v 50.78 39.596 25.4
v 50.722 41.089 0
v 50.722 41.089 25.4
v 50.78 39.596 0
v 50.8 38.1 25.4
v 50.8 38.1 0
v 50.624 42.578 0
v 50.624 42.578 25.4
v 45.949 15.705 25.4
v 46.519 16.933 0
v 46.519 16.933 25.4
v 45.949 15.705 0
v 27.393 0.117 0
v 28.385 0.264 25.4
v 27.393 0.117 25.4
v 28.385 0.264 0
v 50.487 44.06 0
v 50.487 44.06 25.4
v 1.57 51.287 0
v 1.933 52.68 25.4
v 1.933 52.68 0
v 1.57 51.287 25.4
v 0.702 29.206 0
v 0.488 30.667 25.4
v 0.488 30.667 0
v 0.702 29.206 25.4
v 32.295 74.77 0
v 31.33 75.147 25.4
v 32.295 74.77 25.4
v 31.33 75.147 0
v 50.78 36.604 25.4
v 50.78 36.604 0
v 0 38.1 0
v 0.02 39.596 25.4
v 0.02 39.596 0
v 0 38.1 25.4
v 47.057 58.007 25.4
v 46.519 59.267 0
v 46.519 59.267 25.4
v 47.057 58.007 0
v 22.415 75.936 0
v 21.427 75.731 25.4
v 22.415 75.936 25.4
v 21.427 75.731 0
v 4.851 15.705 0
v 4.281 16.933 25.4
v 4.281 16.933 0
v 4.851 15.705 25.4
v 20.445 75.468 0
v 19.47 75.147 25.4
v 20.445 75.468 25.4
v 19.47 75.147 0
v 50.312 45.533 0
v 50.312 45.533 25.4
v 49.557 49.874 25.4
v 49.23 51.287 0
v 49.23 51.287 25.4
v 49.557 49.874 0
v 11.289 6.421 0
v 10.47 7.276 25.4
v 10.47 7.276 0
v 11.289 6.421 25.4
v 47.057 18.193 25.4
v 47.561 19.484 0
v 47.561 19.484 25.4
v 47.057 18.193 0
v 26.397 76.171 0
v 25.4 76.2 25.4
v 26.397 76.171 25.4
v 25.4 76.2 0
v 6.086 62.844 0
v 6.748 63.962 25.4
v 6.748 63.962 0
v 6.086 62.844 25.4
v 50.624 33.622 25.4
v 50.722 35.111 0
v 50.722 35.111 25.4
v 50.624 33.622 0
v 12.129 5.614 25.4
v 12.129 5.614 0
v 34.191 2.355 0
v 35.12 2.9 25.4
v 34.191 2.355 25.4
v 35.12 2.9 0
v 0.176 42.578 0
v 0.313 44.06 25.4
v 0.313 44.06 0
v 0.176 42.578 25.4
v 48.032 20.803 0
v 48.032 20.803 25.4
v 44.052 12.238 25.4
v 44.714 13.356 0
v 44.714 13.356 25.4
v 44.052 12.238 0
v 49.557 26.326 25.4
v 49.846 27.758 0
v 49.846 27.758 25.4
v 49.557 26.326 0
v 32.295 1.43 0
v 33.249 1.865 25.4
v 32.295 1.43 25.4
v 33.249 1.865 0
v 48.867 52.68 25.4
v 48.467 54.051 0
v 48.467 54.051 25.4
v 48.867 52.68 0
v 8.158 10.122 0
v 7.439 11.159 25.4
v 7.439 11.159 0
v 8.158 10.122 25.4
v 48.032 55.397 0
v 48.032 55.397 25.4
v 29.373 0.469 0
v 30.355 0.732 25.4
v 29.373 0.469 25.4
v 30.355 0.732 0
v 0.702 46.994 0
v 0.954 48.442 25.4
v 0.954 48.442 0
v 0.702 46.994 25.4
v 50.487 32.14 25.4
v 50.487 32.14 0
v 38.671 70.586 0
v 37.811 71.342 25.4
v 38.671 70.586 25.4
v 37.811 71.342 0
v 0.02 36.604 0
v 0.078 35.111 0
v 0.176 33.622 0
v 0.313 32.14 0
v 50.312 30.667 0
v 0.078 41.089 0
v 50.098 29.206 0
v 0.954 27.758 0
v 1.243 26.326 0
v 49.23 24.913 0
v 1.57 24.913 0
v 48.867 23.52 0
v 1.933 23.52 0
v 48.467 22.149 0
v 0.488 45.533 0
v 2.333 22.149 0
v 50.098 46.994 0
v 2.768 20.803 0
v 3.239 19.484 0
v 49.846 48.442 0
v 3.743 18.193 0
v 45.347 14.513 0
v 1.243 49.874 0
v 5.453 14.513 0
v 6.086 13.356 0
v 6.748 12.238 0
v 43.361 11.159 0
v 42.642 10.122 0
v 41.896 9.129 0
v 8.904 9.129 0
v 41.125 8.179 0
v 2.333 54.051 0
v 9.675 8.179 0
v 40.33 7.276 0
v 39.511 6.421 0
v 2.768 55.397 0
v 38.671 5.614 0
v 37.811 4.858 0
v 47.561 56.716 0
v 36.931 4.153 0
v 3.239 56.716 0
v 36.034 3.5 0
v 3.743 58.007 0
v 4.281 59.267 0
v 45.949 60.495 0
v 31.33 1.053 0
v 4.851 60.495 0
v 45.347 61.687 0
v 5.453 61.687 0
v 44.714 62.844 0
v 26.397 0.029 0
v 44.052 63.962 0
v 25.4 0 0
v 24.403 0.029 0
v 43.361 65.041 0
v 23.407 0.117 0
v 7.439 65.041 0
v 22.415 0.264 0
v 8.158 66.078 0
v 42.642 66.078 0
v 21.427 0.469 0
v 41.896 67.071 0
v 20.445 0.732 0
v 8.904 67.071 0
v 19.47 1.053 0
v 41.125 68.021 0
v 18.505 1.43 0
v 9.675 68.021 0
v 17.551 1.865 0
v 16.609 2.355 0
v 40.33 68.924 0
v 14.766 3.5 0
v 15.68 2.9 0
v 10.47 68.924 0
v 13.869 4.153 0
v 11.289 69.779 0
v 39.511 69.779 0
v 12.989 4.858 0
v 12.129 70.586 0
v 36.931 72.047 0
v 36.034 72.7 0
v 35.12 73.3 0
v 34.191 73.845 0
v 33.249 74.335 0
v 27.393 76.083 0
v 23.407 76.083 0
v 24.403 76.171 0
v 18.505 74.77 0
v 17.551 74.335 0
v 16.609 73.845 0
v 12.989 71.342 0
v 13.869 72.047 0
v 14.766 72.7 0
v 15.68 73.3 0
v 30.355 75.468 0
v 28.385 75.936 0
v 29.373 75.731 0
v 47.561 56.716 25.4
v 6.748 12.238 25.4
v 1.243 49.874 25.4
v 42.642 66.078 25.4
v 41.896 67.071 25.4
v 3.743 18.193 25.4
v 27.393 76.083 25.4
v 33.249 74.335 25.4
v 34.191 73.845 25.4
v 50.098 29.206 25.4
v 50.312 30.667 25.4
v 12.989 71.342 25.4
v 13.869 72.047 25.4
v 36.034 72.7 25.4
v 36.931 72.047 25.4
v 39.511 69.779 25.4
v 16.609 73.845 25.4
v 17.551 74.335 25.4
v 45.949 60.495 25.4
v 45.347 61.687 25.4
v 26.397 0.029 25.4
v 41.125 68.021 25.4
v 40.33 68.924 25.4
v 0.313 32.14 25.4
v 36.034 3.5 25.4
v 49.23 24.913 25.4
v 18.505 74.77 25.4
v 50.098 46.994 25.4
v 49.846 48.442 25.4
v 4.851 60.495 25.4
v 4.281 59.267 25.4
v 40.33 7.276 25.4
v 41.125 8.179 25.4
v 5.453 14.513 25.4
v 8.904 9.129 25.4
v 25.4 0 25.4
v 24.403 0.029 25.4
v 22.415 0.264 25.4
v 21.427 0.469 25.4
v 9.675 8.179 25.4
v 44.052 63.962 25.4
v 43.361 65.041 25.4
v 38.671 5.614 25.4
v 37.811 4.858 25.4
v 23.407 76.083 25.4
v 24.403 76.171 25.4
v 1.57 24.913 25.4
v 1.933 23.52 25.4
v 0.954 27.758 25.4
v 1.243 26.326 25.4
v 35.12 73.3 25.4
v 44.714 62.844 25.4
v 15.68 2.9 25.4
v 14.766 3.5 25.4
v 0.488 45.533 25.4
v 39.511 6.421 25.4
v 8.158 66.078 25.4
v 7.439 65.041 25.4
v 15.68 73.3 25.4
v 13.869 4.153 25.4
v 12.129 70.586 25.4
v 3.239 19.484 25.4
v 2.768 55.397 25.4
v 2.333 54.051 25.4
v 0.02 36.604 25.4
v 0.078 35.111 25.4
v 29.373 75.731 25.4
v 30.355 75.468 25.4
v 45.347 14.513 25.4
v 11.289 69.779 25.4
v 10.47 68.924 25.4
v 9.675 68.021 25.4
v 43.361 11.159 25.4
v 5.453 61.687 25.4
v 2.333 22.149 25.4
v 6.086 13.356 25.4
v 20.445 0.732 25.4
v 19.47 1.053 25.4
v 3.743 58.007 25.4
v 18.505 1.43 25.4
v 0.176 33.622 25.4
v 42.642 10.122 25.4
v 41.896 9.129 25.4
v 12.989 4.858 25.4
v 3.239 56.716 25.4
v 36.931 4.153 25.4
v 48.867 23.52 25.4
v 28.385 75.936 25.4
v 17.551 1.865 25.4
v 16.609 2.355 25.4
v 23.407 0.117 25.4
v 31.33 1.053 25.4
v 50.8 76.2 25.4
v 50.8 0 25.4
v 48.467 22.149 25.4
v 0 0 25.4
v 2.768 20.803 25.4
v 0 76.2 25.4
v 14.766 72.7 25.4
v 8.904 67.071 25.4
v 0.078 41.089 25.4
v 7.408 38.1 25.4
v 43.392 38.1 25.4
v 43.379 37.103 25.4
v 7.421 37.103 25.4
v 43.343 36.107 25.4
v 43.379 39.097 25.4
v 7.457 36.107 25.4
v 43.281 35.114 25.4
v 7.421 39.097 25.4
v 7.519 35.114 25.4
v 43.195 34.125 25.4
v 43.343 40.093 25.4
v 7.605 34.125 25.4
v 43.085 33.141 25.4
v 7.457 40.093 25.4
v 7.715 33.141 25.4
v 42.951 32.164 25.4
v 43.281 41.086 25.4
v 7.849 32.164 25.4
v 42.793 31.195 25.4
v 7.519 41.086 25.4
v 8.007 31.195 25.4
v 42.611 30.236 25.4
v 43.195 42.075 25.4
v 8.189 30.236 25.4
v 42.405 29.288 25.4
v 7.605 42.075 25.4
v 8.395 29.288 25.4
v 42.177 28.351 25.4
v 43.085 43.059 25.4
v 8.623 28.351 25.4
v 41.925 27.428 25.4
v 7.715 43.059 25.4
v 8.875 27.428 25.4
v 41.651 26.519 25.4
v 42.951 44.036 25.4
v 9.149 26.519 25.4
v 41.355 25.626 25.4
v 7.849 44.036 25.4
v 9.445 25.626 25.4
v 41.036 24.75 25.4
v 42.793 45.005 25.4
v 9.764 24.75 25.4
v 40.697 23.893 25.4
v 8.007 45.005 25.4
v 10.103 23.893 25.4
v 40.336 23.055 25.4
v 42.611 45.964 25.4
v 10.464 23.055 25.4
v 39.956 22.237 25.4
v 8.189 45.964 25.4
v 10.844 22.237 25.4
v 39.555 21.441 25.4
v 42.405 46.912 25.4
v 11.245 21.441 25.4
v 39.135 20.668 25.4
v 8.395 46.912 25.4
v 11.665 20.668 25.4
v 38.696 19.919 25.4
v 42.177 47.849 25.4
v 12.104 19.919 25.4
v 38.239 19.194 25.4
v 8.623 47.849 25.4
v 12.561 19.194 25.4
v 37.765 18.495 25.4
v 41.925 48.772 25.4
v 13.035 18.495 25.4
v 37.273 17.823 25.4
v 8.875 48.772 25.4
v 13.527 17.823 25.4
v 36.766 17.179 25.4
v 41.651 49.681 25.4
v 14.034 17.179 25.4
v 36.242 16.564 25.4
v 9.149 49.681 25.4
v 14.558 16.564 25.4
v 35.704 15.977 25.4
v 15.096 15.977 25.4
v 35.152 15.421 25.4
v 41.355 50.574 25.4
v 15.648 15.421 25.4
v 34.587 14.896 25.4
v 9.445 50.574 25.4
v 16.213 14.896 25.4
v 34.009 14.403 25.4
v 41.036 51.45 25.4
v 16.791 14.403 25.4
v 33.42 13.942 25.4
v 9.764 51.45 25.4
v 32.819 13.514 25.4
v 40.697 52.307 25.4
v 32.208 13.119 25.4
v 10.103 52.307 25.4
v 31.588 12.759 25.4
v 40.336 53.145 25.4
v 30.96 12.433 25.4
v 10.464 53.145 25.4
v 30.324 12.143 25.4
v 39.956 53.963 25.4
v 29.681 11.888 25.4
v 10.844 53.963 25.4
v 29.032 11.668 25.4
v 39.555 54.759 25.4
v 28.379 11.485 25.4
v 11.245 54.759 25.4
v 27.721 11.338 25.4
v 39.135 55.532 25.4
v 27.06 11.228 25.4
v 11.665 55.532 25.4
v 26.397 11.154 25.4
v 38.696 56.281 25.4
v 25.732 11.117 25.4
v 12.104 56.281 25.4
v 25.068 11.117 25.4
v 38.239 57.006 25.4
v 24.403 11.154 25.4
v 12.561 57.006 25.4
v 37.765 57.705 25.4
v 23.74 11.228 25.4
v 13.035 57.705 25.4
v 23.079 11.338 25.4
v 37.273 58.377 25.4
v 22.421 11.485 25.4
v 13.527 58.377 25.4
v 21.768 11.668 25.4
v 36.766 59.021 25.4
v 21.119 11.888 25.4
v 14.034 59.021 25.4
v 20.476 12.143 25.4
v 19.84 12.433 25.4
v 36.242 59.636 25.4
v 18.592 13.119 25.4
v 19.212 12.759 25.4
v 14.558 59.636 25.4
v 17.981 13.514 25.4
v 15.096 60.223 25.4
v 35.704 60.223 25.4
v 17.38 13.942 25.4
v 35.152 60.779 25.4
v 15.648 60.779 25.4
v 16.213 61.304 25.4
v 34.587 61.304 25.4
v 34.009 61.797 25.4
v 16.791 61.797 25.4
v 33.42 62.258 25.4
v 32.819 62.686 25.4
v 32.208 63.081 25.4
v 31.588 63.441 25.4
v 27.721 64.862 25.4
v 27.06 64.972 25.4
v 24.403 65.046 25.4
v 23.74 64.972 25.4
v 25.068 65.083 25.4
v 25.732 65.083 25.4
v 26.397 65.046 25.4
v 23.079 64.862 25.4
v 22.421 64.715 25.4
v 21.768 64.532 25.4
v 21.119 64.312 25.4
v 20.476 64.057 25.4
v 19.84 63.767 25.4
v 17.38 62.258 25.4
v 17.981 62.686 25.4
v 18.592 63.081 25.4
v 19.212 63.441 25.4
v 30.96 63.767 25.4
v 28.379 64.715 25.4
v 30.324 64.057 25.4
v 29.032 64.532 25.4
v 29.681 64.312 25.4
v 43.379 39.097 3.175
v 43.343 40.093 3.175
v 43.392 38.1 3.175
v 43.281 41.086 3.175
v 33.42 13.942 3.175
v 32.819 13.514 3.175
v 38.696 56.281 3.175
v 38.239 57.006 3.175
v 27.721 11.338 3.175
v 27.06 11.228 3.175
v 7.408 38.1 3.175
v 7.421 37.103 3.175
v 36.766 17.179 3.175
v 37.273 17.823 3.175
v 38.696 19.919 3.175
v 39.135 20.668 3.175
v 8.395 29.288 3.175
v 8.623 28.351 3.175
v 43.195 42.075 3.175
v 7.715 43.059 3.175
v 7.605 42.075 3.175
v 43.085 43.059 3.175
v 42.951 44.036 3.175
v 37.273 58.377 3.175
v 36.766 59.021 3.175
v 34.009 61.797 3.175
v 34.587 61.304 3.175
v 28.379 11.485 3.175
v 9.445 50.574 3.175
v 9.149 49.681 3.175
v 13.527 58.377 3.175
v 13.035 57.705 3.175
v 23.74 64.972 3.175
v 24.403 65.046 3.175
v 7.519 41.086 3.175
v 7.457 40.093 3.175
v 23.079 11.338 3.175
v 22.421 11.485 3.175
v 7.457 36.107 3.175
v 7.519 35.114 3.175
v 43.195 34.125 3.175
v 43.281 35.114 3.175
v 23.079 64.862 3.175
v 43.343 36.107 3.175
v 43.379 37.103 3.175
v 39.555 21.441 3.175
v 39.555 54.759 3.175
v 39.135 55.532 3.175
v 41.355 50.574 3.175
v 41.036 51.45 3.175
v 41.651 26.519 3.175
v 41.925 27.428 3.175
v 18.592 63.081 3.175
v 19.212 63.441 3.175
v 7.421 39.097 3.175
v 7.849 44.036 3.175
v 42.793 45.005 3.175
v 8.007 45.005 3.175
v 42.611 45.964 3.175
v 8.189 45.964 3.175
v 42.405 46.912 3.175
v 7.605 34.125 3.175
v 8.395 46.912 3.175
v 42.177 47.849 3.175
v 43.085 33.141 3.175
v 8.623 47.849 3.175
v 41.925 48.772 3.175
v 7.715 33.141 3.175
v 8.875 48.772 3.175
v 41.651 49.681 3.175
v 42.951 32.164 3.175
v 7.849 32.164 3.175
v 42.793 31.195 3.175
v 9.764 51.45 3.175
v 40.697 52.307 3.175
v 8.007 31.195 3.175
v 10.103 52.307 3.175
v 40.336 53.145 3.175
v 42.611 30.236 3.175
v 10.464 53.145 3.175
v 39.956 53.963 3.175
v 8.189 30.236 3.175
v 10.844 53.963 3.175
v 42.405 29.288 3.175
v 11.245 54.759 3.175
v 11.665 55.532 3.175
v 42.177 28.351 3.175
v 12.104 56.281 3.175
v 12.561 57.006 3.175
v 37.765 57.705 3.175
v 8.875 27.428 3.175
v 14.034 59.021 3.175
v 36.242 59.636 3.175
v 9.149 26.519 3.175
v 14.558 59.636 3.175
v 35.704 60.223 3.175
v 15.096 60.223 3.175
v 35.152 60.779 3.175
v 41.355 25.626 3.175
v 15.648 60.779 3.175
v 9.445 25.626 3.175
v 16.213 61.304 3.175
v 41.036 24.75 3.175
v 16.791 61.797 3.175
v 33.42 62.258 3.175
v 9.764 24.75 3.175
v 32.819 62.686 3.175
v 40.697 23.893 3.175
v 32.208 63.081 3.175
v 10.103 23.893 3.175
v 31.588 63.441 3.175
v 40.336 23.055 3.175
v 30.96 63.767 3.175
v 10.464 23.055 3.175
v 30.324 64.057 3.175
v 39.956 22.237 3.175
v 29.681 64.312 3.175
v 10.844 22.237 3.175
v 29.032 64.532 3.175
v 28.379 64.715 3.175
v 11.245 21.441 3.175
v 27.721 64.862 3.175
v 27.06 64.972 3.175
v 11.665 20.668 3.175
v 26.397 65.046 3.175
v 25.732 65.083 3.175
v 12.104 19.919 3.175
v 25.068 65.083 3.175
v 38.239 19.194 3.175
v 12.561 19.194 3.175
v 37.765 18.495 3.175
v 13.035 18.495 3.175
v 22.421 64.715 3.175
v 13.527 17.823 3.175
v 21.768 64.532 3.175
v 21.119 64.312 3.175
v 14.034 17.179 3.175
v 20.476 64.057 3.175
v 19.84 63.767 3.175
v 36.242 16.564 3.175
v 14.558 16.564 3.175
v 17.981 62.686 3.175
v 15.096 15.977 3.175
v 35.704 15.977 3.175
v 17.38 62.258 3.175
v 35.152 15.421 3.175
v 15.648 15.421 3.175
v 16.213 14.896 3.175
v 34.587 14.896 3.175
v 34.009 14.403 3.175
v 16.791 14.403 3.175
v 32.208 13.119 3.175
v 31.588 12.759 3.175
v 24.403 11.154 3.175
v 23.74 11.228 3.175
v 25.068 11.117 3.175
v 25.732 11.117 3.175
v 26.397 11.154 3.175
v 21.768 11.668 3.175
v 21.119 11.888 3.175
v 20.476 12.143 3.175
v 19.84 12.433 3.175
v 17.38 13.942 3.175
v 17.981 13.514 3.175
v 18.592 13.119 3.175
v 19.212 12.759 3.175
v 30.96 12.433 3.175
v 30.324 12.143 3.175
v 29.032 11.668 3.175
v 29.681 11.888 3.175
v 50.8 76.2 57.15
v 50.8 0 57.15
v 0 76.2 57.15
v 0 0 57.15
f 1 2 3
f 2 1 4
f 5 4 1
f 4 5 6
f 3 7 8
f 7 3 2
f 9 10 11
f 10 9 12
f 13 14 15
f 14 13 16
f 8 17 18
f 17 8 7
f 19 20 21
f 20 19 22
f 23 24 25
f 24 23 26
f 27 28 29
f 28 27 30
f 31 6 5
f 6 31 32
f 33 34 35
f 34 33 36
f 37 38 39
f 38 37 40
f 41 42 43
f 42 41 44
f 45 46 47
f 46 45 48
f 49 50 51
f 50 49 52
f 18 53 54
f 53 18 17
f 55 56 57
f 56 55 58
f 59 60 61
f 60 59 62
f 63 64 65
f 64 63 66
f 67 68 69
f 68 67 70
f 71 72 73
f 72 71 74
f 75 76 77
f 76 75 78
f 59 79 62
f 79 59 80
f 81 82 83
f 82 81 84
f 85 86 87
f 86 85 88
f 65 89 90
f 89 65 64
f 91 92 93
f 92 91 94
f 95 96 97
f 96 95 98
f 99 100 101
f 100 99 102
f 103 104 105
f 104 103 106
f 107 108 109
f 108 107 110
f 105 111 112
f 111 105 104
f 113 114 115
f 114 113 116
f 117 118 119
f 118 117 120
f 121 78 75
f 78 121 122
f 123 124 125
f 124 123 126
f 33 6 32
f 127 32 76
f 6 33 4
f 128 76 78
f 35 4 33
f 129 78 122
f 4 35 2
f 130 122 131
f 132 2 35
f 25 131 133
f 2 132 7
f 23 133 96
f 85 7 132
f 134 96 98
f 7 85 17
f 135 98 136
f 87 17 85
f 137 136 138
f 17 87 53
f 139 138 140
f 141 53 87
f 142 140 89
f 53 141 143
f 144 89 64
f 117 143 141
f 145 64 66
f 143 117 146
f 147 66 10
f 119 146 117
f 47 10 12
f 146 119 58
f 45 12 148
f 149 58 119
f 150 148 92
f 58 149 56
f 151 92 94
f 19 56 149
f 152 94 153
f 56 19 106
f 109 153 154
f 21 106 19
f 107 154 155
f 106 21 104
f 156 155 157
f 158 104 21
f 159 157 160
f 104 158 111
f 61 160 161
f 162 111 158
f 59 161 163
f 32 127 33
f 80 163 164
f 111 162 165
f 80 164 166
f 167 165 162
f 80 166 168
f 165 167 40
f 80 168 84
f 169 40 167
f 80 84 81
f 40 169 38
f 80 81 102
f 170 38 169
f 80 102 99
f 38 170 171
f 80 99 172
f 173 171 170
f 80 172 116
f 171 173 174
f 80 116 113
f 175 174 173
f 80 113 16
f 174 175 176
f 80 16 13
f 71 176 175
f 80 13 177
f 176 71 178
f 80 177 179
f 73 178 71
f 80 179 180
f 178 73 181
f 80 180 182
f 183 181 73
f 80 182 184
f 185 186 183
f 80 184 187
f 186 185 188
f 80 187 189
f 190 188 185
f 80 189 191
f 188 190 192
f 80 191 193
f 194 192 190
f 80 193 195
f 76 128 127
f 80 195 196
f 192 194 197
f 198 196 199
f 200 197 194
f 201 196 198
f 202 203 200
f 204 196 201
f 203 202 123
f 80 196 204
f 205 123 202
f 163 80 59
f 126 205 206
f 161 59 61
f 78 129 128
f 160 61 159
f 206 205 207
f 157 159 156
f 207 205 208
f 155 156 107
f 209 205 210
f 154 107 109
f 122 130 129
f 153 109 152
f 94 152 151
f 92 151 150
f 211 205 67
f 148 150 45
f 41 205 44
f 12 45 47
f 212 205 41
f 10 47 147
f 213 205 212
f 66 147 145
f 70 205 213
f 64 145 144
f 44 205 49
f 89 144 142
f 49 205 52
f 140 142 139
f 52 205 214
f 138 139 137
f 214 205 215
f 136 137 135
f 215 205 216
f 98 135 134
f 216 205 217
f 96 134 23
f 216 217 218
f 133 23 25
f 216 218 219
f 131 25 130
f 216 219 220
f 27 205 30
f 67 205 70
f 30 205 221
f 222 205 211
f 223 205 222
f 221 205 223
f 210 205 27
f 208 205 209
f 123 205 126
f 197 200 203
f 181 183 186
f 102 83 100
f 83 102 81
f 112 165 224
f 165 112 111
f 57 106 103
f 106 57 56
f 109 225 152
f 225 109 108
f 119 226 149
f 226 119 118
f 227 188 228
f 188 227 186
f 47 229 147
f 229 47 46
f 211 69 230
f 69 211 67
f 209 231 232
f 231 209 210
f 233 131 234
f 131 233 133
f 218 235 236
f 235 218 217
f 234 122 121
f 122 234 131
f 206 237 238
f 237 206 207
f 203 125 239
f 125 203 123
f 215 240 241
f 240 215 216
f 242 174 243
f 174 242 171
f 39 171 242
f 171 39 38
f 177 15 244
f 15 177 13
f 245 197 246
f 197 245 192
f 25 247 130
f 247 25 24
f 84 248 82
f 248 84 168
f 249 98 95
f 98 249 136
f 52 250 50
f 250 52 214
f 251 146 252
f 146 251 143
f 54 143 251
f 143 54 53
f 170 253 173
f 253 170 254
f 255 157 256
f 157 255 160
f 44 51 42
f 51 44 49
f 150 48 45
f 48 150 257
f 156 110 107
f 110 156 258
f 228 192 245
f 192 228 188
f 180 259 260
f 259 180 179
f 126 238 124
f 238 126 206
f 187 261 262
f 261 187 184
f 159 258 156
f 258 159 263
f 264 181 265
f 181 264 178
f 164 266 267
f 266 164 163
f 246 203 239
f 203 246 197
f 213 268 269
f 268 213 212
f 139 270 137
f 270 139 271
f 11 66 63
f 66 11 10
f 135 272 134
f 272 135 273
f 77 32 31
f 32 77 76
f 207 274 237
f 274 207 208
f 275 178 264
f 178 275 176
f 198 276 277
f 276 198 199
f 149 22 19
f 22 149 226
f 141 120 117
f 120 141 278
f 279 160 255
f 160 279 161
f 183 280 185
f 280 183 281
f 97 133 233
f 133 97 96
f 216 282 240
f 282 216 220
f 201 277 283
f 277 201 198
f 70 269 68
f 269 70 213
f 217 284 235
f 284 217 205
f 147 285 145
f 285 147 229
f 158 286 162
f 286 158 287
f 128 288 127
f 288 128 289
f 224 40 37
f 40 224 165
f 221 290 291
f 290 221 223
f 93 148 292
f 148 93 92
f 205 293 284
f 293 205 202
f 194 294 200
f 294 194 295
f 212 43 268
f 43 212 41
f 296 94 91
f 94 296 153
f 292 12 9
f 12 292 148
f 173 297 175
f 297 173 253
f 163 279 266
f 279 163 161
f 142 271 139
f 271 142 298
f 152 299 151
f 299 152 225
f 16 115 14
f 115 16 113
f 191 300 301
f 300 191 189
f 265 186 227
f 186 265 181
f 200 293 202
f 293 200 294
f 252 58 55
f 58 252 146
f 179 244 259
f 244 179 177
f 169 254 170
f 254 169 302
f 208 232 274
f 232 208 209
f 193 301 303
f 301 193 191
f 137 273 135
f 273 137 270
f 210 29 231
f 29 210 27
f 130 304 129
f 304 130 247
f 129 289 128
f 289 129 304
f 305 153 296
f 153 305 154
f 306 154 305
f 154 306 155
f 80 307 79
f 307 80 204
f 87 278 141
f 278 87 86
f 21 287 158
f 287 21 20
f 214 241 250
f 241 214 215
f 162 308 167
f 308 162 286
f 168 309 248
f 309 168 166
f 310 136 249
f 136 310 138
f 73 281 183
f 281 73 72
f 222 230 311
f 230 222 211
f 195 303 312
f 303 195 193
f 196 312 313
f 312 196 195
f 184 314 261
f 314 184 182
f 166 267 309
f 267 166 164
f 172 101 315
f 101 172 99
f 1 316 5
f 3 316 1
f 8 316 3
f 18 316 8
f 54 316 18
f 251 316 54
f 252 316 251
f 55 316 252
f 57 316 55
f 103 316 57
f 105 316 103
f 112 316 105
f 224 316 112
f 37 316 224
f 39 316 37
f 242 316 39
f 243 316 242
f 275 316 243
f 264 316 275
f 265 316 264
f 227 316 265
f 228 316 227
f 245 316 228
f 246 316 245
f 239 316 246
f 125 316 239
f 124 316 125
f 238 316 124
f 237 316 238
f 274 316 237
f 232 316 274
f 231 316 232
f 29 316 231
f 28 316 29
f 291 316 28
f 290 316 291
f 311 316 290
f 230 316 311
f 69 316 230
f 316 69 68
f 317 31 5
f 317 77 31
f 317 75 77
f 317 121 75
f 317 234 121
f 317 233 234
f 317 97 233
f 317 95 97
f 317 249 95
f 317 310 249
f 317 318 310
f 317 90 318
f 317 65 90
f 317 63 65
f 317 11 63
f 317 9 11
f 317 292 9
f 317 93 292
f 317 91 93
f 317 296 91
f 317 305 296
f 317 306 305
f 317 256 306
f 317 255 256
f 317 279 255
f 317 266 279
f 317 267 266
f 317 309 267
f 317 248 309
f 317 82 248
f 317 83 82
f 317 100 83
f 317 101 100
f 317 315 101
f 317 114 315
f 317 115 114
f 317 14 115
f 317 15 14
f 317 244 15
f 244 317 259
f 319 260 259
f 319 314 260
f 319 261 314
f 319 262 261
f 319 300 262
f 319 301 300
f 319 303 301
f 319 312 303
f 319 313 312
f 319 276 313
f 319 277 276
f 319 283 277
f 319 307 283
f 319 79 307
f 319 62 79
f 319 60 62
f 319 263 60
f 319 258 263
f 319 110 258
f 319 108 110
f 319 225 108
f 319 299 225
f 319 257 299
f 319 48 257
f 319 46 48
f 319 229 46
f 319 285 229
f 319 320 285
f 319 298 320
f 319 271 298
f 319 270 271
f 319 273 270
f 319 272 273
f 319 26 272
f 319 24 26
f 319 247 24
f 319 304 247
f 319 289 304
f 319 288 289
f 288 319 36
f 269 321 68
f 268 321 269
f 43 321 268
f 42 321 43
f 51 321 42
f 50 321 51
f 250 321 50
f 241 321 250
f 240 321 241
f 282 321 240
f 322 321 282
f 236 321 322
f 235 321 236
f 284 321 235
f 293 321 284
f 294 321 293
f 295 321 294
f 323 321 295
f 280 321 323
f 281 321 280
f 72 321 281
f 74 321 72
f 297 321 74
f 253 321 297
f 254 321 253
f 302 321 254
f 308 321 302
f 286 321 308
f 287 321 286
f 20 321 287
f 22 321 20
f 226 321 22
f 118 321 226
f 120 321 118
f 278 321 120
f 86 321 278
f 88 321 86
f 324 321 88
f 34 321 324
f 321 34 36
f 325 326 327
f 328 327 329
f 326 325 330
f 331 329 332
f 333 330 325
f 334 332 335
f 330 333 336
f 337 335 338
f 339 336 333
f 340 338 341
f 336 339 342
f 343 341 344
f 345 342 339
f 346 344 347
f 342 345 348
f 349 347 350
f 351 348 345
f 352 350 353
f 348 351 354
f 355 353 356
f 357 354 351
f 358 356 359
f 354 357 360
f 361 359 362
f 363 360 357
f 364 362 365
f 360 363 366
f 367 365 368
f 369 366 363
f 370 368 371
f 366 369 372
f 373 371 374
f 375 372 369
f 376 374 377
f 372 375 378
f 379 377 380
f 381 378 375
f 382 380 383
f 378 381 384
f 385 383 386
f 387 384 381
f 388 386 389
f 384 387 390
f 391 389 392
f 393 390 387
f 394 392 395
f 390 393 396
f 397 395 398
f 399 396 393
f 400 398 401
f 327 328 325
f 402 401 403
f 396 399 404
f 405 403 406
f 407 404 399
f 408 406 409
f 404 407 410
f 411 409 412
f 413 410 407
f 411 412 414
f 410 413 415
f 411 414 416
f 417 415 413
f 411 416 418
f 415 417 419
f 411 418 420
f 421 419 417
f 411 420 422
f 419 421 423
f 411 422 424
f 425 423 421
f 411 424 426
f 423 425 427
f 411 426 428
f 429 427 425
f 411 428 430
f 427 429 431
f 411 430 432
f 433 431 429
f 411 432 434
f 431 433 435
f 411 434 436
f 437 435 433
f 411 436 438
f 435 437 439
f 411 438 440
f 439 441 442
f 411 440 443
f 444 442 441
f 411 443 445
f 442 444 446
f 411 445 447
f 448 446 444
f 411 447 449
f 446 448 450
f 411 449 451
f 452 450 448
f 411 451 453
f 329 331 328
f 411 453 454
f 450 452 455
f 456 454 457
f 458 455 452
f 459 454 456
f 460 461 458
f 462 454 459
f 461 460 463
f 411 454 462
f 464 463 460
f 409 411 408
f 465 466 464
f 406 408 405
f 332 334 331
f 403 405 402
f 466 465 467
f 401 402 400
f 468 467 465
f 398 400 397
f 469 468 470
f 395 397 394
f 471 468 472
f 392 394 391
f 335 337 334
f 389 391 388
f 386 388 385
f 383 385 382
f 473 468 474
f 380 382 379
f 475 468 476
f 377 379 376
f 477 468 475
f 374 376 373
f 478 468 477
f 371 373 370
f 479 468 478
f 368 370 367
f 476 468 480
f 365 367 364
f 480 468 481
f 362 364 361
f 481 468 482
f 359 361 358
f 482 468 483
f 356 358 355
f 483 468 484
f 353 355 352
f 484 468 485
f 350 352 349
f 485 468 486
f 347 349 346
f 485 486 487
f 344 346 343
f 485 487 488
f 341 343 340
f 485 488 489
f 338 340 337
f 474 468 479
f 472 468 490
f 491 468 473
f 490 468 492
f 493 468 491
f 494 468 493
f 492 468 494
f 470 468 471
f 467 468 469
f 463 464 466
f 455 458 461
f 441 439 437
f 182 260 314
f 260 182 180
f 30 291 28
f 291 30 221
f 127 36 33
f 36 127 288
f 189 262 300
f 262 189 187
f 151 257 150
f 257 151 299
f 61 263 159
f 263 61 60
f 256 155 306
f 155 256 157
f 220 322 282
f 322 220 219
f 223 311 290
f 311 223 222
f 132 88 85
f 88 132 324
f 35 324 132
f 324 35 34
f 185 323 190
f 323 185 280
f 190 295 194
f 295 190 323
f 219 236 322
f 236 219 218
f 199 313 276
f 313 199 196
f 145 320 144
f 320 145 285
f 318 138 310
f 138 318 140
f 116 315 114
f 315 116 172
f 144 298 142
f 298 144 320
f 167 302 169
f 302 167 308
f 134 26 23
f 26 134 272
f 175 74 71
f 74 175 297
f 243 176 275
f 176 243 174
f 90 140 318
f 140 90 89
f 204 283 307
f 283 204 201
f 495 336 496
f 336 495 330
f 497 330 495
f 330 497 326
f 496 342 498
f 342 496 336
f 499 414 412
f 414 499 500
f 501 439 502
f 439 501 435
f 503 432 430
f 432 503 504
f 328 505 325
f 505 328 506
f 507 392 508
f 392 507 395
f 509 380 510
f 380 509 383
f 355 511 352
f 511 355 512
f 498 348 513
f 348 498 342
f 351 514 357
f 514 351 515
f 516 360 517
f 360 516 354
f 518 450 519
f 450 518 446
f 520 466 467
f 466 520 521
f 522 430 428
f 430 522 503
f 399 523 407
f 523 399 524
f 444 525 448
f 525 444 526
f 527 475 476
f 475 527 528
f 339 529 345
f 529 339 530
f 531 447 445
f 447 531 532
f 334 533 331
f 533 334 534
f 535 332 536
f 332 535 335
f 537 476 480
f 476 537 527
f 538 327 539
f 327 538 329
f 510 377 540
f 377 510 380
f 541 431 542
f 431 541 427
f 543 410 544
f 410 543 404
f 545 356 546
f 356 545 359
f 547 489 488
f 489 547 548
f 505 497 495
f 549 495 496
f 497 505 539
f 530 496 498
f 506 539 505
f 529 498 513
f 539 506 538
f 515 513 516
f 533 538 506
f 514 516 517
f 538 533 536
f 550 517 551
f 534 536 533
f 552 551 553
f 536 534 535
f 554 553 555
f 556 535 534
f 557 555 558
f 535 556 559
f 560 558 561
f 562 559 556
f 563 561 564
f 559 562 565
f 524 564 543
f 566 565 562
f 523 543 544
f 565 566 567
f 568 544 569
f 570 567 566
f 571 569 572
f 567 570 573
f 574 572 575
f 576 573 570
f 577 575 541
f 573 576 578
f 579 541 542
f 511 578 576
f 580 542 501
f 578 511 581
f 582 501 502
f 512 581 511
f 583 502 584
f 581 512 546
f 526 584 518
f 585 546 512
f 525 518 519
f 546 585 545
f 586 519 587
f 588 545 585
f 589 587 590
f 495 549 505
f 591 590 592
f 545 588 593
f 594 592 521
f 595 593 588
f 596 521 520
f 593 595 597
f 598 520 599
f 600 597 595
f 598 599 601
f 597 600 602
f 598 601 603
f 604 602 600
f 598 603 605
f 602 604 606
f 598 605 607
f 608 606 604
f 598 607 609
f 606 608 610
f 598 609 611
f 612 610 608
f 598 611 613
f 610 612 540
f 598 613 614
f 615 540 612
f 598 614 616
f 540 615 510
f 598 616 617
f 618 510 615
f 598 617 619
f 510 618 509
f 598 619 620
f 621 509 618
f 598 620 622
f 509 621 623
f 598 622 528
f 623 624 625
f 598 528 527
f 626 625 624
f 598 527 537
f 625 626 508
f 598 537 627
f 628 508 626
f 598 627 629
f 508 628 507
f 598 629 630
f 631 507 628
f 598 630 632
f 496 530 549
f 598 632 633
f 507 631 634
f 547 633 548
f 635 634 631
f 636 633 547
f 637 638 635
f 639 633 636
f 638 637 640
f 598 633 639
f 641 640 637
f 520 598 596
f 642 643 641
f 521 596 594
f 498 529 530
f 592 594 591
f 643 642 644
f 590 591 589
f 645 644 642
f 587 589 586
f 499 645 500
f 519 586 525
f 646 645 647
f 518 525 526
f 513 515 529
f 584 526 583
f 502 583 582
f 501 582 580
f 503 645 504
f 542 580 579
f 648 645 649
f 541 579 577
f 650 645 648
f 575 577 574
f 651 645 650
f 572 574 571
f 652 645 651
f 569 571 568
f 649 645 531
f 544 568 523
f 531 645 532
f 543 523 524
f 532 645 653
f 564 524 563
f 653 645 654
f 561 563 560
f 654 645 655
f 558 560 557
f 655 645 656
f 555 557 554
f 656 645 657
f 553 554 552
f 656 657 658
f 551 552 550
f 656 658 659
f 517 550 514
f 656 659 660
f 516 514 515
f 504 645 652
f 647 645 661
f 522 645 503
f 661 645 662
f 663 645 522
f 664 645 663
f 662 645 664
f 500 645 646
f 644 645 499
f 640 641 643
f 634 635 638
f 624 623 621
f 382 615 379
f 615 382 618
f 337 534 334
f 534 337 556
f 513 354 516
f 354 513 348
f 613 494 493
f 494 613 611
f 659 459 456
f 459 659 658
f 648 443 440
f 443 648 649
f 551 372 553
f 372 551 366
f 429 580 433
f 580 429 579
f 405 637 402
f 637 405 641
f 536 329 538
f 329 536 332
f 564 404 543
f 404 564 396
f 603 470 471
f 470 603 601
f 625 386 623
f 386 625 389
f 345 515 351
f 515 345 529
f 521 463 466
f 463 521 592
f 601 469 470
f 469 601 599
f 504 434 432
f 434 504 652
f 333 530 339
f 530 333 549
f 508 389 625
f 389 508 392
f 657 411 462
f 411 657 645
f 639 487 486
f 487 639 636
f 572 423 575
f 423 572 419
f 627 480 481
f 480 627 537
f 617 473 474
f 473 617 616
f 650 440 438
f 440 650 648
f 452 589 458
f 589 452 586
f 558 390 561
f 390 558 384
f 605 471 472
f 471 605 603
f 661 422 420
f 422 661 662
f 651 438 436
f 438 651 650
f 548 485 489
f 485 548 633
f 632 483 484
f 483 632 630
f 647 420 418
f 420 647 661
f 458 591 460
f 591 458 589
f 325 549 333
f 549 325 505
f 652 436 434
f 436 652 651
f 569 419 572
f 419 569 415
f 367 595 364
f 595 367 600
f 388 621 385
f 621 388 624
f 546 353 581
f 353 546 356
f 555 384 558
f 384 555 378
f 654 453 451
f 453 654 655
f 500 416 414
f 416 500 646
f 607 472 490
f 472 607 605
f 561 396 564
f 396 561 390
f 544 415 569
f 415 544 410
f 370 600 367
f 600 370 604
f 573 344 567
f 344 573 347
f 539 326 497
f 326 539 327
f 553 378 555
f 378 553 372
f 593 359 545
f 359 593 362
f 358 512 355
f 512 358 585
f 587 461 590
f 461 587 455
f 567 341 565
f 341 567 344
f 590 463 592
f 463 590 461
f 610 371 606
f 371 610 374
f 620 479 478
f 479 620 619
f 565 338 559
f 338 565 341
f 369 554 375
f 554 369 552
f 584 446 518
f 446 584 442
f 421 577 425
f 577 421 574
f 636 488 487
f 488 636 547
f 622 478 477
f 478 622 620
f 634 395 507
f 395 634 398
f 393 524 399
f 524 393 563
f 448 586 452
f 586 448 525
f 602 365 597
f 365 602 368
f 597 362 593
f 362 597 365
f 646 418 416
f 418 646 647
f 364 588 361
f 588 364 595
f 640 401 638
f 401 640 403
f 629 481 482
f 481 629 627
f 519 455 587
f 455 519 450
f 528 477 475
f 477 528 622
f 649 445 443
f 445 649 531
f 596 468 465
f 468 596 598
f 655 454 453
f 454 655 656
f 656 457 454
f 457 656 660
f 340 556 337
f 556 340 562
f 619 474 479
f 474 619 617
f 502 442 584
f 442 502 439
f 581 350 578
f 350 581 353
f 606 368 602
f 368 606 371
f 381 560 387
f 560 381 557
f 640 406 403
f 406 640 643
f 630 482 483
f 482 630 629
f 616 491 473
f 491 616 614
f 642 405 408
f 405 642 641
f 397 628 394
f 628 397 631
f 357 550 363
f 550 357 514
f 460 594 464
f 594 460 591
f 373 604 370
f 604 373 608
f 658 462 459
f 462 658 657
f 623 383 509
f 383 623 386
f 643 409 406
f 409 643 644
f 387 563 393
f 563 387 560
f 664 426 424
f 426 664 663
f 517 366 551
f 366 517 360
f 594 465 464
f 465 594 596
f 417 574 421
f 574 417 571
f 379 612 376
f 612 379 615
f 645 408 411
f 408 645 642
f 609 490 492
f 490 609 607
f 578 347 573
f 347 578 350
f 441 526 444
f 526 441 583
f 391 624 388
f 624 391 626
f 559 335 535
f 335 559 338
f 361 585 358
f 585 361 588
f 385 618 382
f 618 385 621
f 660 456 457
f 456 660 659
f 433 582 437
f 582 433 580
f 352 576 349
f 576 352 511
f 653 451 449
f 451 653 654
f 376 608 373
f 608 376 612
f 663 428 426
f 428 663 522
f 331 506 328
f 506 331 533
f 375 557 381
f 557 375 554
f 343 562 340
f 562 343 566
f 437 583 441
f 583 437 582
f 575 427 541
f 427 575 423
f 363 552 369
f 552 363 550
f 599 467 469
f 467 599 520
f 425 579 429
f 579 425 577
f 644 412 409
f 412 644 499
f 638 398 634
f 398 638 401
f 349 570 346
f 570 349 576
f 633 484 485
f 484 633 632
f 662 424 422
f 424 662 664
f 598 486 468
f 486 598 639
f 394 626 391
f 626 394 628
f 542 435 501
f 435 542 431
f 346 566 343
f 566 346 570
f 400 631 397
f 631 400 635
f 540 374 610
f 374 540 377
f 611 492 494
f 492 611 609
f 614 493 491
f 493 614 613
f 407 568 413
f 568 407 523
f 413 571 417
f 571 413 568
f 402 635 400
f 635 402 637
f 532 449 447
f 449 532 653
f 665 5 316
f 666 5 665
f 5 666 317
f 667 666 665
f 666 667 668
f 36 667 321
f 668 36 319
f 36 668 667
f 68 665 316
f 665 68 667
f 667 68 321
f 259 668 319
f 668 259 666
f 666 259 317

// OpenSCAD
//Please use the Customizer to interact with this (if necessary, show it by clearing the checkbox in front of View | Hide Customizer), and close this Editor window.

/* [Overview] */
//Part
PARTNO = "0"; // [0:All, 1:Top, 2:Bottom]

//Type of Lid (to implement: 2:Hinged)
LidType = "0"; // [0:None, 1:Fitted]

//Type of Corner (to implement: 3:Chamfered, 4:Inset Circle (Flipped Fillet))
BoxShape = "0"; // [0:Round/Oval, 1:Square, 2:Rounded (Fillet)]

//Size of Corner Feature
cornersize=0.25;


//Height of box bottom (expressed as a percentage if using a lid)
boxbottomheight=50; // [0:100]

//Endmill Diameter
diameter=0.125;

//Fit Tolerance
fittolerance=0.001;

//Part Spacing
partspacing=2;

$fa=1;
$fs=1;
//$fn=100;

//Units
Units="0"; // [0:Inches, 1:Millimeters]

/* [Size] */
//Length
length = 3;

//Width
width = 2;

//Height
height = 2;

//Thickness
thickness = 0.375;

//Lid and Bottom Thickness
bottomthickness=0.125;

/* [Dividers] */
//Number of Dividers
Dividers = 0;

//Orientation of Dividers
DividerOrientation = "0"; // [0:widthwise, 1:lengthwise, 2:grid, 3:diagonal, 4:grid with lengthwise pocket, 5:grid with widthwise pocket]


conversionfactor = (Units=="0") ? 25.4 : 1;

cwidth = width*conversionfactor;
clength = length*conversionfactor;
cheight = height*conversionfactor;
cthickness = thickness*conversionfactor;
cbottomthickness=bottomthickness*conversionfactor;
cpartspacing=partspacing*conversionfactor;

ccs=cornersize*conversionfactor;

cdiameter = diameter*conversionfactor;
ctolerance = fittolerance*conversionfactor;

cinteriorwidth = cwidth-cthickness*2;
cinteriorlength = clength-cthickness*2;

cinteriorheight=cheight-cbottomthickness*2-cthickness;

//Height of Dividers (percentage of interior height)
//DividerHeight = 50; //[0:100]

//cdivheight=cinteriorheight*DividerHeight/100;

Divs=Dividers+1;

cadjh=cbottomthickness*2+((cheight-cbottomthickness*2)*boxbottomheight/100)-cdiameter;


module HP(x,y,z,w,l,h,d){hull() {
translate([x+d/2,y+d/2,z]) cylinder(h = h, r1 = d/2, r2 = d/2, center = false);
translate([w+x-d/2,y+d/2,z]) cylinder(h = h, r1 = d/2, r2 = d/2, center = false);
translate([w+x-d/2,l+y-d/2,z]) cylinder(h = h, r1 = d/2, r2 = d/2, center = false);
translate([x+d/2,l+y-d/2,z]) cylinder(h = h, r1 = d/2, r2 = d/2, center = false);
};};

module pocket(x,y,z,a,b,c,e,h,d){hull() {
translate([x,y,z]) cylinder(h = h, r1 = d/2, r2 = d/2, center = false);
translate([a,b,z]) cylinder(h = h, r1 = d/2, r2 = d/2, center = false);
translate([c,e,z]) cylinder(h = h, r1 = d/2, r2 = d/2, center = false);
};};

module chamferedbox(x,y,z,w,l,h,d){difference() {translate([x,y,z]) cube(size = [w,l,h], center = false);
union(){
rotate([0,0,45]) translate([-d,-d,-h/10])cube(size = [d*2,d*2,h*1.2], center = false);
translate([cwidth,-d*1.5,-h/10])rotate([0,0,45]) cube(size = [d*2,d*2,h*1.2], center = false);
translate([cwidth,clength-d*1.5,-h/10])rotate([0,0,45]) cube(size = [d*2,d*2,h*1.2], center = false);
translate([0,clength-d*1.5,-h/10])rotate([0,0,45]) cube(size = [d*2,d*2,h*1.2], center = false);
};
}
};

module ogeebox(x,y,z,w,l,h,d){difference() {translate([x,y,z]) cube(size = [w,l,h], center = false);
union(){
rotate([0,0,45]) translate([-d,-d,-h/10])cube(size = [d*2,d*2,h*1.2], center = false);
translate([cwidth,-d*1.5,-h/10])rotate([0,0,45]) cube(size = [d*2,d*2,h*1.2], center = false);
translate([cwidth,clength-d*1.5,-h/10])rotate([0,0,45]) cube(size = [d*2,d*2,h*1.2], center = false);
translate([0,clength-d*1.5,-h/10])rotate([0,0,45]) cube(size = [d*2,d*2,h*1.2], center = false);
};
}
};

//if (cwidth == clength) 
//{
    xs = 1;
    ys = 1;
//}
    
if (cwidth > clength) {xs = cwidth/clength;
    ys = 1;}

if (cwidth < clength) 
{xs = 1;
    ys = clength/cwidth;}
//else



//Bottom
module Bottom() {difference(){
    union() {
//cylinder(h = h, r1 = d/2, r2 = d/2, center = false);
if (BoxShape=="0" && cwidth == clength) translate([cwidth/2,clength/2,0])cylinder(h = cadjh, r1 = cwidth/2, r2 = cwidth/2, center = false);
if (BoxShape=="0" && cwidth > clength) translate([cwidth/2,clength/2,0])scale([cwidth/clength,1,1]) cylinder(h = cadjh, r1 = clength/2, r2 = clength/2, center = false);
if (BoxShape=="0" && cwidth < clength) translate([cwidth/2,clength/2,0])scale([1,clength/cwidth,1]) cylinder(h = cadjh, r1 = cwidth/2, r2 = cwidth/2, center = false);
if (BoxShape=="1") cube(size = [cwidth,clength,cadjh], center = false);
if (BoxShape=="2") HP(0,0,0,cwidth,clength,cadjh,ccs);
if (BoxShape=="3") chamferedbox(0,0,0,cwidth,clength,cadjh,ccs);
if (BoxShape=="4") ogeebox(0,0,0,cwidth,clength,cadjh,ccs);
    
if (BoxShape=="0" && cwidth == clength) 
{translate([cwidth/2,clength/2,cbottomthickness]) cylinder(h = cadjh, r1 = (cwidth-cthickness)/2, r2 = (cwidth-cthickness)/2, center = false);}

if (BoxShape=="0" && cwidth > clength) 
{translate([cwidth/2,clength/2,cbottomthickness]) scale([cwidth/clength,1,1]) cylinder(h = cadjh, r1 = (clength-cthickness)/2, r2 = (clength-cthickness)/2, center = false);}

if (BoxShape=="0" && cwidth < clength) 
{translate([cwidth/2,clength/2,cbottomthickness]) scale([1,clength/cwidth,1]) cylinder(h = cadjh, r1 = (cwidth-cthickness)/2, r2 = (cwidth-cthickness)/2, center = false);}


if (BoxShape!="0")
  HP(cthickness-cdiameter,cthickness-cdiameter,cbottomthickness,cwidth-cthickness*2+cdiameter*2,clength-cthickness*2+cdiameter*2,cadjh,cdiameter);  
};

if (BoxShape=="0" && cwidth == clength)
{       
translate([cwidth/2,cwidth/2,cbottomthickness])cylinder(h = cheight, r1 = (cwidth-cthickness-cdiameter*2)/2, r2 = (cwidth-cthickness-cdiameter*2)/2, center = false);
}

if (BoxShape=="0" && cwidth > clength)
{       
translate([cwidth/2,clength/2,cbottomthickness]) scale([1,clength/cwidth,1]) cylinder(h = cheight, r1 = (cwidth-cthickness*2-cdiameter)/2, r2 = (cwidth-cthickness*2-cdiameter)/2, center = false);
}

if (BoxShape=="0" && cwidth < clength)
{       
translate([cwidth/2,clength/2,cbottomthickness]) scale([cwidth/clength,1,1]) cylinder(h = cheight, r1 = (clength-cthickness*2-cdiameter)/2, r2 = (clength-cthickness*2-cdiameter)/2, center = false);
}

if (Dividers == 0 && BoxShape!="0")
{       
HP(cthickness,cthickness,cbottomthickness,cwidth-cthickness*2,clength-cthickness*2,cheight,cdiameter);
}
{
if ((Dividers >= 1)&&(DividerOrientation == "0") && (BoxShape!="0"))
   {for (i = [1 : Divs]){
pocket=(clength-cthickness*2-cdiameter*(Dividers))/(Divs);
//(x,y,z,w,l,h,d)
HP(
//x
cthickness,
//y
cthickness+(pocket*(i-1))+cdiameter*(i-1),
//z
cbottomthickness,
//width
cwidth-cthickness-cdiameter*2,
//length
pocket,
cheight,
cdiameter);
};
};
};
{
if ((Dividers >= 1)&&(DividerOrientation == "1") && BoxShape!="0")
   {for (i = [1 : Divs]){
pocket=(cwidth-cthickness*2-cdiameter*(Dividers))/(Divs);
//(x,y,z,w,l,h,d)
HP(
//x
cthickness+(pocket*(i-1))+cdiameter*(i-1),
//y
cthickness,
//z
cbottomthickness,
//width
pocket,
//length
clength-cthickness-cdiameter*2,
cheight,
cdiameter);
   };
};
};


{
if ((Dividers >= 1)&&(DividerOrientation == "2") && BoxShape!="0")
   {pocketwidth=(cwidth-cthickness*2-cdiameter*(Dividers))/(Divs);
pocketlength=(clength-cthickness*2-cdiameter*(Dividers))/(Divs);
for (i = [1 : Divs], j = [1 : Divs])
       //
{
//i=1;
//j=1;
//(x,y,z,w,l,h,d)
HP(
//x
cthickness+(pocketwidth*(i-1))+cdiameter*(i-1),
//y
cthickness+(pocketlength*(j-1))+cdiameter*(j-1),
//z
cbottomthickness,
//width
pocketwidth,
//length
pocketlength,
cheight,
cdiameter);};
};
};




{
if ((Dividers == 1)&&(DividerOrientation == "3") && BoxShape!="0")
   {//(x,y,z,a,b,c,e,h,d)
pocket(//x
       cthickness+cdiameter/2,
       //y
       cthickness+cdiameter/2,
       //z
       cbottomthickness,
       //a
       cwidth-cthickness-cdiameter*2,
       //b
       cthickness+cdiameter/2,
       //c
       cthickness+cdiameter/2,
       //e
       clength-cthickness-cdiameter*2,
       cheight,cdiameter);
   
pocket(cwidth-cthickness-cdiameter/2,clength-cthickness-cdiameter/2,cbottomthickness,cthickness+cdiameter*2,clength-cthickness-cdiameter/2,cwidth-cthickness-cdiameter/2,cthickness+cdiameter*2,cheight,cdiameter);
};
};


{
if ((Dividers > 1)&&(DividerOrientation == "3") && BoxShape!="0")
   {//(x,y,z,a,b,c,e,h,d)
pocket(//x
       cthickness+cdiameter/2,
       //y
       cthickness+cdiameter*2,
       //z
       cbottomthickness,
       //a
       cwidth/2-cthickness+cdiameter/2,
       //b
       clength/2,
       //c
       cthickness+cdiameter/2,
       //e
       clength-cthickness-cdiameter*2,
       cheight,cdiameter);
pocket(//x
       cwidth-cthickness-cdiameter/2,
       //y
       cthickness+cdiameter*2,
       //z
       cbottomthickness,
       //a
       cwidth/2+cthickness-cdiameter/2,
       //b
       clength/2,
       //c
       cwidth-cthickness-cdiameter/2,
       //e
       clength-cthickness-cdiameter*2,
       cheight,cdiameter);
pocket(cwidth-cthickness-cdiameter*2,
   clength-cthickness-cdiameter/2,
   cbottomthickness,
   cthickness+cdiameter*2,clength-cthickness-cdiameter/2,
   cwidth/2,
   clength/2+cthickness-cdiameter/2,
   cheight,cdiameter);
pocket(cwidth-cthickness-cdiameter*2,
   cthickness+cdiameter/2,
   cbottomthickness,
   cthickness+cdiameter*2,cthickness+cdiameter/2,
   cwidth/2,
   clength/2-cthickness+cdiameter/2,
   cheight,cdiameter);
};};

{
if ((Dividers >= 1)&&(DividerOrientation == "4") && BoxShape!="0")
   {pocketwidth=(cwidth-cthickness*2-cdiameter*(Dividers))/(Divs);
pocketlength=(clength-cthickness*2-cdiameter*(Dividers))/(Divs);
for (i = [1 : Divs], j = [1 : Divs])
       //
{
HP(
//x
cthickness+(pocketwidth*(i-1))+cdiameter*(i-1),
//y
cthickness+(pocketlength*(j-1))+cdiameter*(j-1),
//z
cbottomthickness,
//width
pocketwidth,
//length
pocketlength,
cheight,
cdiameter);};

if (Dividers % 2 == 0) {
pocket=(cwidth-cthickness*2-cdiameter*(Dividers))/(Divs);
//(x,y,z,w,l,h,d)
HP(
//x
//cthickness,
cwidth/2-pocket/2,
//y
cthickness,
//z
cbottomthickness,
//width
pocket,
//length
clength-cthickness-cdiameter*2,
cheight,
cdiameter);
}
};
};


{
if ((Dividers >= 1)&&(DividerOrientation == "5") && BoxShape!="0")
   {pocketwidth=(cwidth-cthickness*2-cdiameter*(Dividers))/(Divs);
pocketlength=(clength-cthickness*2-cdiameter*(Dividers))/(Divs);
for (i = [1 : Divs], j = [1 : Divs])
       //
{
//i=1;
//j=1;
//(x,y,z,w,l,h,d)
HP(
//x
cthickness+(pocketwidth*(i-1))+cdiameter*(i-1),
//y
cthickness+(pocketlength*(j-1))+cdiameter*(j-1),
//z
cbottomthickness,
//width
pocketwidth,
//length
pocketlength,
cheight,
cdiameter);};

pocket=(clength-cthickness*2-cdiameter*(Dividers))/(Divs);
//(x,y,z,w,l,h,d)
HP(
//x
cthickness,
//y
cthickness,
//z
cbottomthickness,
//width
cwidth-cthickness-cdiameter*2,
//length
pocket,
cheight,
cdiameter);

};
};
}

{
if (BoxShape=="0" && cwidth == clength && DividerOrientation == "0" && DividerOrientation != "3") {
    //rotate(a = [0, 0, 90]) 
    translate(v = [cwidth/2, clength/2, cheight/2+cbottomthickness/4])  
    for ( i = [1 : Dividers] ){
    rotate(a = [0, 0, 180/Dividers*i]) 
    cube(size = [cdiameter,clength-cthickness*2+cdiameter,cheight-cbottomthickness/2], center = true);}
}}
{
if ((Dividers >= 1)&& BoxShape=="0" && cwidth == clength && DividerOrientation == "3")
{       
translate([cwidth/2,cwidth/2,cbottomthickness])intersection() {cylinder(h = cadjh, r1 = (cwidth-cthickness-cdiameter*2)/2, r2 = (cwidth-cthickness-cdiameter*2)/2, center = false);
    union(){
   translate([0,-cwidth/4-cdiameter/2,0]) difference(){cylinder(h = cheight,r1=cwidth/4+cdiameter,r2=cwidth/4+cdiameter);union(){cylinder(h = cheight*1.1,r1=cwidth/4,r2=cwidth/4);;translate([-cwidth/2,-cwidth/4+cdiameter,0])cube(size = [cwidth/2,cwidth/2,cheight*2], center = false);}}
    translate([0,cwidth/4+cdiameter/2,0]) difference(){cylinder(h = cheight,r1=cwidth/4+cdiameter,r2=cwidth/4+cdiameter); union(){cylinder(h = cheight*1.1,r1=cwidth/4,r2=cwidth/4);translate([0,-cwidth/4-cdiameter,0])cube(size = [cwidth,clength,cheight*2], center = false);}
}}
   }
}

if (LidType == "0") {translate ([0,0,cadjh]) cube(size = [cwidth,clength,(cheight-cheight*boxbottomheight/100)+cdiameter*2], center = false);} 


//translate([cwidth/2,clength/2,0]) #cylinder(h = cheight*2, r1 = cdiameter/2, r2 = cdiameter/2, center = false);
};
};


//Top
module Top() {
    translate([0,clength+cpartspacing,0]){
    difference(){
    union() {
//cube(size = [cwidth,clength,(cheight-cheight*boxbottomheight/100)+cdiameter*2], center = false);
if (BoxShape=="0" && cwidth == clength) translate([cwidth/2,cwidth/2,0])cylinder(h = (cheight-cheight*boxbottomheight/100)+cdiameter*2, r1 = cwidth/2, r2 = cwidth/2, center = false);
if (BoxShape=="0" && cwidth > clength) translate([cwidth/2,clength/2,0])scale([1,clength/cwidth,1]) cylinder(h = (cheight-cheight*boxbottomheight/100)+cdiameter*2, r1 = cwidth/2, r2 = cwidth/2, center = false);
if (BoxShape=="0" && cwidth < clength) translate([cwidth/2,clength/2,0])scale([cwidth/clength,1,1]) cylinder(h = (cheight-cheight*boxbottomheight/100)+cdiameter*2, r1 = clength/2, r2 = clength/2, center = false);
if (BoxShape=="1") cube(size = [cwidth,clength,(cheight-cheight*boxbottomheight/100)+cdiameter*2], center = false);
if (BoxShape=="2") HP(0,0,0,cwidth,clength,(cheight-cheight*boxbottomheight/100)+cdiameter*2,ccs);

    };

//if (Dividers == 0)
{if (BoxShape=="0" && cwidth == clength) translate([cwidth/2,cwidth/2,cbottomthickness]) cylinder(h = cheight, r1 = (cwidth-cthickness)/2, r2 = (cwidth-cthickness)/2, center = false);

if (BoxShape=="0" && cwidth < clength) translate([cwidth/2,clength/2,cbottomthickness]) scale([cwidth/clength,1,1]) cylinder(h = cheight, r1 = (clength-cthickness)/2, r2 = (clength-cthickness)/2, center = false);

if (BoxShape=="0" && cwidth > clength) translate([cwidth/2,clength/2,cbottomthickness]) scale([1,clength/cwidth,1]) cylinder(h = cheight, r1 = (cwidth-cthickness)/2, r2 = (cwidth-cthickness)/2, center = false);

if (BoxShape!="0")
HP(cthickness-cdiameter-ctolerance/2,cthickness-cdiameter-ctolerance/2,cbottomthickness,cwidth-cthickness*2+cdiameter*2+ctolerance/2,clength-cthickness*2+cdiameter*2+ctolerance/2,cheight*2,cdiameter);
};              
};
};
};


// [[0:All, 1:Top, 2:Bottom,3:Dividers]
//[0:None, 1:Fitted, 2:Hinged]

 if (PARTNO == "1") Top();
 if (PARTNO == "2") Bottom();
       
  // optionally use 0 for whole object
 if (PARTNO == "0") {
 if (LidType == "1")   Top();
  Bottom();
 }
 
 if (PARTNO == "3") {
for (i = [-1, 1]){
    translate([0, 0, i])
    cube(size = 1, center = false);
}

 }; 
//module HP(x,y,z,w,l,h,d)
//HP(0,0,0,25,50,12,6.35);
 
//#cube([cwidth,clength,120]);
